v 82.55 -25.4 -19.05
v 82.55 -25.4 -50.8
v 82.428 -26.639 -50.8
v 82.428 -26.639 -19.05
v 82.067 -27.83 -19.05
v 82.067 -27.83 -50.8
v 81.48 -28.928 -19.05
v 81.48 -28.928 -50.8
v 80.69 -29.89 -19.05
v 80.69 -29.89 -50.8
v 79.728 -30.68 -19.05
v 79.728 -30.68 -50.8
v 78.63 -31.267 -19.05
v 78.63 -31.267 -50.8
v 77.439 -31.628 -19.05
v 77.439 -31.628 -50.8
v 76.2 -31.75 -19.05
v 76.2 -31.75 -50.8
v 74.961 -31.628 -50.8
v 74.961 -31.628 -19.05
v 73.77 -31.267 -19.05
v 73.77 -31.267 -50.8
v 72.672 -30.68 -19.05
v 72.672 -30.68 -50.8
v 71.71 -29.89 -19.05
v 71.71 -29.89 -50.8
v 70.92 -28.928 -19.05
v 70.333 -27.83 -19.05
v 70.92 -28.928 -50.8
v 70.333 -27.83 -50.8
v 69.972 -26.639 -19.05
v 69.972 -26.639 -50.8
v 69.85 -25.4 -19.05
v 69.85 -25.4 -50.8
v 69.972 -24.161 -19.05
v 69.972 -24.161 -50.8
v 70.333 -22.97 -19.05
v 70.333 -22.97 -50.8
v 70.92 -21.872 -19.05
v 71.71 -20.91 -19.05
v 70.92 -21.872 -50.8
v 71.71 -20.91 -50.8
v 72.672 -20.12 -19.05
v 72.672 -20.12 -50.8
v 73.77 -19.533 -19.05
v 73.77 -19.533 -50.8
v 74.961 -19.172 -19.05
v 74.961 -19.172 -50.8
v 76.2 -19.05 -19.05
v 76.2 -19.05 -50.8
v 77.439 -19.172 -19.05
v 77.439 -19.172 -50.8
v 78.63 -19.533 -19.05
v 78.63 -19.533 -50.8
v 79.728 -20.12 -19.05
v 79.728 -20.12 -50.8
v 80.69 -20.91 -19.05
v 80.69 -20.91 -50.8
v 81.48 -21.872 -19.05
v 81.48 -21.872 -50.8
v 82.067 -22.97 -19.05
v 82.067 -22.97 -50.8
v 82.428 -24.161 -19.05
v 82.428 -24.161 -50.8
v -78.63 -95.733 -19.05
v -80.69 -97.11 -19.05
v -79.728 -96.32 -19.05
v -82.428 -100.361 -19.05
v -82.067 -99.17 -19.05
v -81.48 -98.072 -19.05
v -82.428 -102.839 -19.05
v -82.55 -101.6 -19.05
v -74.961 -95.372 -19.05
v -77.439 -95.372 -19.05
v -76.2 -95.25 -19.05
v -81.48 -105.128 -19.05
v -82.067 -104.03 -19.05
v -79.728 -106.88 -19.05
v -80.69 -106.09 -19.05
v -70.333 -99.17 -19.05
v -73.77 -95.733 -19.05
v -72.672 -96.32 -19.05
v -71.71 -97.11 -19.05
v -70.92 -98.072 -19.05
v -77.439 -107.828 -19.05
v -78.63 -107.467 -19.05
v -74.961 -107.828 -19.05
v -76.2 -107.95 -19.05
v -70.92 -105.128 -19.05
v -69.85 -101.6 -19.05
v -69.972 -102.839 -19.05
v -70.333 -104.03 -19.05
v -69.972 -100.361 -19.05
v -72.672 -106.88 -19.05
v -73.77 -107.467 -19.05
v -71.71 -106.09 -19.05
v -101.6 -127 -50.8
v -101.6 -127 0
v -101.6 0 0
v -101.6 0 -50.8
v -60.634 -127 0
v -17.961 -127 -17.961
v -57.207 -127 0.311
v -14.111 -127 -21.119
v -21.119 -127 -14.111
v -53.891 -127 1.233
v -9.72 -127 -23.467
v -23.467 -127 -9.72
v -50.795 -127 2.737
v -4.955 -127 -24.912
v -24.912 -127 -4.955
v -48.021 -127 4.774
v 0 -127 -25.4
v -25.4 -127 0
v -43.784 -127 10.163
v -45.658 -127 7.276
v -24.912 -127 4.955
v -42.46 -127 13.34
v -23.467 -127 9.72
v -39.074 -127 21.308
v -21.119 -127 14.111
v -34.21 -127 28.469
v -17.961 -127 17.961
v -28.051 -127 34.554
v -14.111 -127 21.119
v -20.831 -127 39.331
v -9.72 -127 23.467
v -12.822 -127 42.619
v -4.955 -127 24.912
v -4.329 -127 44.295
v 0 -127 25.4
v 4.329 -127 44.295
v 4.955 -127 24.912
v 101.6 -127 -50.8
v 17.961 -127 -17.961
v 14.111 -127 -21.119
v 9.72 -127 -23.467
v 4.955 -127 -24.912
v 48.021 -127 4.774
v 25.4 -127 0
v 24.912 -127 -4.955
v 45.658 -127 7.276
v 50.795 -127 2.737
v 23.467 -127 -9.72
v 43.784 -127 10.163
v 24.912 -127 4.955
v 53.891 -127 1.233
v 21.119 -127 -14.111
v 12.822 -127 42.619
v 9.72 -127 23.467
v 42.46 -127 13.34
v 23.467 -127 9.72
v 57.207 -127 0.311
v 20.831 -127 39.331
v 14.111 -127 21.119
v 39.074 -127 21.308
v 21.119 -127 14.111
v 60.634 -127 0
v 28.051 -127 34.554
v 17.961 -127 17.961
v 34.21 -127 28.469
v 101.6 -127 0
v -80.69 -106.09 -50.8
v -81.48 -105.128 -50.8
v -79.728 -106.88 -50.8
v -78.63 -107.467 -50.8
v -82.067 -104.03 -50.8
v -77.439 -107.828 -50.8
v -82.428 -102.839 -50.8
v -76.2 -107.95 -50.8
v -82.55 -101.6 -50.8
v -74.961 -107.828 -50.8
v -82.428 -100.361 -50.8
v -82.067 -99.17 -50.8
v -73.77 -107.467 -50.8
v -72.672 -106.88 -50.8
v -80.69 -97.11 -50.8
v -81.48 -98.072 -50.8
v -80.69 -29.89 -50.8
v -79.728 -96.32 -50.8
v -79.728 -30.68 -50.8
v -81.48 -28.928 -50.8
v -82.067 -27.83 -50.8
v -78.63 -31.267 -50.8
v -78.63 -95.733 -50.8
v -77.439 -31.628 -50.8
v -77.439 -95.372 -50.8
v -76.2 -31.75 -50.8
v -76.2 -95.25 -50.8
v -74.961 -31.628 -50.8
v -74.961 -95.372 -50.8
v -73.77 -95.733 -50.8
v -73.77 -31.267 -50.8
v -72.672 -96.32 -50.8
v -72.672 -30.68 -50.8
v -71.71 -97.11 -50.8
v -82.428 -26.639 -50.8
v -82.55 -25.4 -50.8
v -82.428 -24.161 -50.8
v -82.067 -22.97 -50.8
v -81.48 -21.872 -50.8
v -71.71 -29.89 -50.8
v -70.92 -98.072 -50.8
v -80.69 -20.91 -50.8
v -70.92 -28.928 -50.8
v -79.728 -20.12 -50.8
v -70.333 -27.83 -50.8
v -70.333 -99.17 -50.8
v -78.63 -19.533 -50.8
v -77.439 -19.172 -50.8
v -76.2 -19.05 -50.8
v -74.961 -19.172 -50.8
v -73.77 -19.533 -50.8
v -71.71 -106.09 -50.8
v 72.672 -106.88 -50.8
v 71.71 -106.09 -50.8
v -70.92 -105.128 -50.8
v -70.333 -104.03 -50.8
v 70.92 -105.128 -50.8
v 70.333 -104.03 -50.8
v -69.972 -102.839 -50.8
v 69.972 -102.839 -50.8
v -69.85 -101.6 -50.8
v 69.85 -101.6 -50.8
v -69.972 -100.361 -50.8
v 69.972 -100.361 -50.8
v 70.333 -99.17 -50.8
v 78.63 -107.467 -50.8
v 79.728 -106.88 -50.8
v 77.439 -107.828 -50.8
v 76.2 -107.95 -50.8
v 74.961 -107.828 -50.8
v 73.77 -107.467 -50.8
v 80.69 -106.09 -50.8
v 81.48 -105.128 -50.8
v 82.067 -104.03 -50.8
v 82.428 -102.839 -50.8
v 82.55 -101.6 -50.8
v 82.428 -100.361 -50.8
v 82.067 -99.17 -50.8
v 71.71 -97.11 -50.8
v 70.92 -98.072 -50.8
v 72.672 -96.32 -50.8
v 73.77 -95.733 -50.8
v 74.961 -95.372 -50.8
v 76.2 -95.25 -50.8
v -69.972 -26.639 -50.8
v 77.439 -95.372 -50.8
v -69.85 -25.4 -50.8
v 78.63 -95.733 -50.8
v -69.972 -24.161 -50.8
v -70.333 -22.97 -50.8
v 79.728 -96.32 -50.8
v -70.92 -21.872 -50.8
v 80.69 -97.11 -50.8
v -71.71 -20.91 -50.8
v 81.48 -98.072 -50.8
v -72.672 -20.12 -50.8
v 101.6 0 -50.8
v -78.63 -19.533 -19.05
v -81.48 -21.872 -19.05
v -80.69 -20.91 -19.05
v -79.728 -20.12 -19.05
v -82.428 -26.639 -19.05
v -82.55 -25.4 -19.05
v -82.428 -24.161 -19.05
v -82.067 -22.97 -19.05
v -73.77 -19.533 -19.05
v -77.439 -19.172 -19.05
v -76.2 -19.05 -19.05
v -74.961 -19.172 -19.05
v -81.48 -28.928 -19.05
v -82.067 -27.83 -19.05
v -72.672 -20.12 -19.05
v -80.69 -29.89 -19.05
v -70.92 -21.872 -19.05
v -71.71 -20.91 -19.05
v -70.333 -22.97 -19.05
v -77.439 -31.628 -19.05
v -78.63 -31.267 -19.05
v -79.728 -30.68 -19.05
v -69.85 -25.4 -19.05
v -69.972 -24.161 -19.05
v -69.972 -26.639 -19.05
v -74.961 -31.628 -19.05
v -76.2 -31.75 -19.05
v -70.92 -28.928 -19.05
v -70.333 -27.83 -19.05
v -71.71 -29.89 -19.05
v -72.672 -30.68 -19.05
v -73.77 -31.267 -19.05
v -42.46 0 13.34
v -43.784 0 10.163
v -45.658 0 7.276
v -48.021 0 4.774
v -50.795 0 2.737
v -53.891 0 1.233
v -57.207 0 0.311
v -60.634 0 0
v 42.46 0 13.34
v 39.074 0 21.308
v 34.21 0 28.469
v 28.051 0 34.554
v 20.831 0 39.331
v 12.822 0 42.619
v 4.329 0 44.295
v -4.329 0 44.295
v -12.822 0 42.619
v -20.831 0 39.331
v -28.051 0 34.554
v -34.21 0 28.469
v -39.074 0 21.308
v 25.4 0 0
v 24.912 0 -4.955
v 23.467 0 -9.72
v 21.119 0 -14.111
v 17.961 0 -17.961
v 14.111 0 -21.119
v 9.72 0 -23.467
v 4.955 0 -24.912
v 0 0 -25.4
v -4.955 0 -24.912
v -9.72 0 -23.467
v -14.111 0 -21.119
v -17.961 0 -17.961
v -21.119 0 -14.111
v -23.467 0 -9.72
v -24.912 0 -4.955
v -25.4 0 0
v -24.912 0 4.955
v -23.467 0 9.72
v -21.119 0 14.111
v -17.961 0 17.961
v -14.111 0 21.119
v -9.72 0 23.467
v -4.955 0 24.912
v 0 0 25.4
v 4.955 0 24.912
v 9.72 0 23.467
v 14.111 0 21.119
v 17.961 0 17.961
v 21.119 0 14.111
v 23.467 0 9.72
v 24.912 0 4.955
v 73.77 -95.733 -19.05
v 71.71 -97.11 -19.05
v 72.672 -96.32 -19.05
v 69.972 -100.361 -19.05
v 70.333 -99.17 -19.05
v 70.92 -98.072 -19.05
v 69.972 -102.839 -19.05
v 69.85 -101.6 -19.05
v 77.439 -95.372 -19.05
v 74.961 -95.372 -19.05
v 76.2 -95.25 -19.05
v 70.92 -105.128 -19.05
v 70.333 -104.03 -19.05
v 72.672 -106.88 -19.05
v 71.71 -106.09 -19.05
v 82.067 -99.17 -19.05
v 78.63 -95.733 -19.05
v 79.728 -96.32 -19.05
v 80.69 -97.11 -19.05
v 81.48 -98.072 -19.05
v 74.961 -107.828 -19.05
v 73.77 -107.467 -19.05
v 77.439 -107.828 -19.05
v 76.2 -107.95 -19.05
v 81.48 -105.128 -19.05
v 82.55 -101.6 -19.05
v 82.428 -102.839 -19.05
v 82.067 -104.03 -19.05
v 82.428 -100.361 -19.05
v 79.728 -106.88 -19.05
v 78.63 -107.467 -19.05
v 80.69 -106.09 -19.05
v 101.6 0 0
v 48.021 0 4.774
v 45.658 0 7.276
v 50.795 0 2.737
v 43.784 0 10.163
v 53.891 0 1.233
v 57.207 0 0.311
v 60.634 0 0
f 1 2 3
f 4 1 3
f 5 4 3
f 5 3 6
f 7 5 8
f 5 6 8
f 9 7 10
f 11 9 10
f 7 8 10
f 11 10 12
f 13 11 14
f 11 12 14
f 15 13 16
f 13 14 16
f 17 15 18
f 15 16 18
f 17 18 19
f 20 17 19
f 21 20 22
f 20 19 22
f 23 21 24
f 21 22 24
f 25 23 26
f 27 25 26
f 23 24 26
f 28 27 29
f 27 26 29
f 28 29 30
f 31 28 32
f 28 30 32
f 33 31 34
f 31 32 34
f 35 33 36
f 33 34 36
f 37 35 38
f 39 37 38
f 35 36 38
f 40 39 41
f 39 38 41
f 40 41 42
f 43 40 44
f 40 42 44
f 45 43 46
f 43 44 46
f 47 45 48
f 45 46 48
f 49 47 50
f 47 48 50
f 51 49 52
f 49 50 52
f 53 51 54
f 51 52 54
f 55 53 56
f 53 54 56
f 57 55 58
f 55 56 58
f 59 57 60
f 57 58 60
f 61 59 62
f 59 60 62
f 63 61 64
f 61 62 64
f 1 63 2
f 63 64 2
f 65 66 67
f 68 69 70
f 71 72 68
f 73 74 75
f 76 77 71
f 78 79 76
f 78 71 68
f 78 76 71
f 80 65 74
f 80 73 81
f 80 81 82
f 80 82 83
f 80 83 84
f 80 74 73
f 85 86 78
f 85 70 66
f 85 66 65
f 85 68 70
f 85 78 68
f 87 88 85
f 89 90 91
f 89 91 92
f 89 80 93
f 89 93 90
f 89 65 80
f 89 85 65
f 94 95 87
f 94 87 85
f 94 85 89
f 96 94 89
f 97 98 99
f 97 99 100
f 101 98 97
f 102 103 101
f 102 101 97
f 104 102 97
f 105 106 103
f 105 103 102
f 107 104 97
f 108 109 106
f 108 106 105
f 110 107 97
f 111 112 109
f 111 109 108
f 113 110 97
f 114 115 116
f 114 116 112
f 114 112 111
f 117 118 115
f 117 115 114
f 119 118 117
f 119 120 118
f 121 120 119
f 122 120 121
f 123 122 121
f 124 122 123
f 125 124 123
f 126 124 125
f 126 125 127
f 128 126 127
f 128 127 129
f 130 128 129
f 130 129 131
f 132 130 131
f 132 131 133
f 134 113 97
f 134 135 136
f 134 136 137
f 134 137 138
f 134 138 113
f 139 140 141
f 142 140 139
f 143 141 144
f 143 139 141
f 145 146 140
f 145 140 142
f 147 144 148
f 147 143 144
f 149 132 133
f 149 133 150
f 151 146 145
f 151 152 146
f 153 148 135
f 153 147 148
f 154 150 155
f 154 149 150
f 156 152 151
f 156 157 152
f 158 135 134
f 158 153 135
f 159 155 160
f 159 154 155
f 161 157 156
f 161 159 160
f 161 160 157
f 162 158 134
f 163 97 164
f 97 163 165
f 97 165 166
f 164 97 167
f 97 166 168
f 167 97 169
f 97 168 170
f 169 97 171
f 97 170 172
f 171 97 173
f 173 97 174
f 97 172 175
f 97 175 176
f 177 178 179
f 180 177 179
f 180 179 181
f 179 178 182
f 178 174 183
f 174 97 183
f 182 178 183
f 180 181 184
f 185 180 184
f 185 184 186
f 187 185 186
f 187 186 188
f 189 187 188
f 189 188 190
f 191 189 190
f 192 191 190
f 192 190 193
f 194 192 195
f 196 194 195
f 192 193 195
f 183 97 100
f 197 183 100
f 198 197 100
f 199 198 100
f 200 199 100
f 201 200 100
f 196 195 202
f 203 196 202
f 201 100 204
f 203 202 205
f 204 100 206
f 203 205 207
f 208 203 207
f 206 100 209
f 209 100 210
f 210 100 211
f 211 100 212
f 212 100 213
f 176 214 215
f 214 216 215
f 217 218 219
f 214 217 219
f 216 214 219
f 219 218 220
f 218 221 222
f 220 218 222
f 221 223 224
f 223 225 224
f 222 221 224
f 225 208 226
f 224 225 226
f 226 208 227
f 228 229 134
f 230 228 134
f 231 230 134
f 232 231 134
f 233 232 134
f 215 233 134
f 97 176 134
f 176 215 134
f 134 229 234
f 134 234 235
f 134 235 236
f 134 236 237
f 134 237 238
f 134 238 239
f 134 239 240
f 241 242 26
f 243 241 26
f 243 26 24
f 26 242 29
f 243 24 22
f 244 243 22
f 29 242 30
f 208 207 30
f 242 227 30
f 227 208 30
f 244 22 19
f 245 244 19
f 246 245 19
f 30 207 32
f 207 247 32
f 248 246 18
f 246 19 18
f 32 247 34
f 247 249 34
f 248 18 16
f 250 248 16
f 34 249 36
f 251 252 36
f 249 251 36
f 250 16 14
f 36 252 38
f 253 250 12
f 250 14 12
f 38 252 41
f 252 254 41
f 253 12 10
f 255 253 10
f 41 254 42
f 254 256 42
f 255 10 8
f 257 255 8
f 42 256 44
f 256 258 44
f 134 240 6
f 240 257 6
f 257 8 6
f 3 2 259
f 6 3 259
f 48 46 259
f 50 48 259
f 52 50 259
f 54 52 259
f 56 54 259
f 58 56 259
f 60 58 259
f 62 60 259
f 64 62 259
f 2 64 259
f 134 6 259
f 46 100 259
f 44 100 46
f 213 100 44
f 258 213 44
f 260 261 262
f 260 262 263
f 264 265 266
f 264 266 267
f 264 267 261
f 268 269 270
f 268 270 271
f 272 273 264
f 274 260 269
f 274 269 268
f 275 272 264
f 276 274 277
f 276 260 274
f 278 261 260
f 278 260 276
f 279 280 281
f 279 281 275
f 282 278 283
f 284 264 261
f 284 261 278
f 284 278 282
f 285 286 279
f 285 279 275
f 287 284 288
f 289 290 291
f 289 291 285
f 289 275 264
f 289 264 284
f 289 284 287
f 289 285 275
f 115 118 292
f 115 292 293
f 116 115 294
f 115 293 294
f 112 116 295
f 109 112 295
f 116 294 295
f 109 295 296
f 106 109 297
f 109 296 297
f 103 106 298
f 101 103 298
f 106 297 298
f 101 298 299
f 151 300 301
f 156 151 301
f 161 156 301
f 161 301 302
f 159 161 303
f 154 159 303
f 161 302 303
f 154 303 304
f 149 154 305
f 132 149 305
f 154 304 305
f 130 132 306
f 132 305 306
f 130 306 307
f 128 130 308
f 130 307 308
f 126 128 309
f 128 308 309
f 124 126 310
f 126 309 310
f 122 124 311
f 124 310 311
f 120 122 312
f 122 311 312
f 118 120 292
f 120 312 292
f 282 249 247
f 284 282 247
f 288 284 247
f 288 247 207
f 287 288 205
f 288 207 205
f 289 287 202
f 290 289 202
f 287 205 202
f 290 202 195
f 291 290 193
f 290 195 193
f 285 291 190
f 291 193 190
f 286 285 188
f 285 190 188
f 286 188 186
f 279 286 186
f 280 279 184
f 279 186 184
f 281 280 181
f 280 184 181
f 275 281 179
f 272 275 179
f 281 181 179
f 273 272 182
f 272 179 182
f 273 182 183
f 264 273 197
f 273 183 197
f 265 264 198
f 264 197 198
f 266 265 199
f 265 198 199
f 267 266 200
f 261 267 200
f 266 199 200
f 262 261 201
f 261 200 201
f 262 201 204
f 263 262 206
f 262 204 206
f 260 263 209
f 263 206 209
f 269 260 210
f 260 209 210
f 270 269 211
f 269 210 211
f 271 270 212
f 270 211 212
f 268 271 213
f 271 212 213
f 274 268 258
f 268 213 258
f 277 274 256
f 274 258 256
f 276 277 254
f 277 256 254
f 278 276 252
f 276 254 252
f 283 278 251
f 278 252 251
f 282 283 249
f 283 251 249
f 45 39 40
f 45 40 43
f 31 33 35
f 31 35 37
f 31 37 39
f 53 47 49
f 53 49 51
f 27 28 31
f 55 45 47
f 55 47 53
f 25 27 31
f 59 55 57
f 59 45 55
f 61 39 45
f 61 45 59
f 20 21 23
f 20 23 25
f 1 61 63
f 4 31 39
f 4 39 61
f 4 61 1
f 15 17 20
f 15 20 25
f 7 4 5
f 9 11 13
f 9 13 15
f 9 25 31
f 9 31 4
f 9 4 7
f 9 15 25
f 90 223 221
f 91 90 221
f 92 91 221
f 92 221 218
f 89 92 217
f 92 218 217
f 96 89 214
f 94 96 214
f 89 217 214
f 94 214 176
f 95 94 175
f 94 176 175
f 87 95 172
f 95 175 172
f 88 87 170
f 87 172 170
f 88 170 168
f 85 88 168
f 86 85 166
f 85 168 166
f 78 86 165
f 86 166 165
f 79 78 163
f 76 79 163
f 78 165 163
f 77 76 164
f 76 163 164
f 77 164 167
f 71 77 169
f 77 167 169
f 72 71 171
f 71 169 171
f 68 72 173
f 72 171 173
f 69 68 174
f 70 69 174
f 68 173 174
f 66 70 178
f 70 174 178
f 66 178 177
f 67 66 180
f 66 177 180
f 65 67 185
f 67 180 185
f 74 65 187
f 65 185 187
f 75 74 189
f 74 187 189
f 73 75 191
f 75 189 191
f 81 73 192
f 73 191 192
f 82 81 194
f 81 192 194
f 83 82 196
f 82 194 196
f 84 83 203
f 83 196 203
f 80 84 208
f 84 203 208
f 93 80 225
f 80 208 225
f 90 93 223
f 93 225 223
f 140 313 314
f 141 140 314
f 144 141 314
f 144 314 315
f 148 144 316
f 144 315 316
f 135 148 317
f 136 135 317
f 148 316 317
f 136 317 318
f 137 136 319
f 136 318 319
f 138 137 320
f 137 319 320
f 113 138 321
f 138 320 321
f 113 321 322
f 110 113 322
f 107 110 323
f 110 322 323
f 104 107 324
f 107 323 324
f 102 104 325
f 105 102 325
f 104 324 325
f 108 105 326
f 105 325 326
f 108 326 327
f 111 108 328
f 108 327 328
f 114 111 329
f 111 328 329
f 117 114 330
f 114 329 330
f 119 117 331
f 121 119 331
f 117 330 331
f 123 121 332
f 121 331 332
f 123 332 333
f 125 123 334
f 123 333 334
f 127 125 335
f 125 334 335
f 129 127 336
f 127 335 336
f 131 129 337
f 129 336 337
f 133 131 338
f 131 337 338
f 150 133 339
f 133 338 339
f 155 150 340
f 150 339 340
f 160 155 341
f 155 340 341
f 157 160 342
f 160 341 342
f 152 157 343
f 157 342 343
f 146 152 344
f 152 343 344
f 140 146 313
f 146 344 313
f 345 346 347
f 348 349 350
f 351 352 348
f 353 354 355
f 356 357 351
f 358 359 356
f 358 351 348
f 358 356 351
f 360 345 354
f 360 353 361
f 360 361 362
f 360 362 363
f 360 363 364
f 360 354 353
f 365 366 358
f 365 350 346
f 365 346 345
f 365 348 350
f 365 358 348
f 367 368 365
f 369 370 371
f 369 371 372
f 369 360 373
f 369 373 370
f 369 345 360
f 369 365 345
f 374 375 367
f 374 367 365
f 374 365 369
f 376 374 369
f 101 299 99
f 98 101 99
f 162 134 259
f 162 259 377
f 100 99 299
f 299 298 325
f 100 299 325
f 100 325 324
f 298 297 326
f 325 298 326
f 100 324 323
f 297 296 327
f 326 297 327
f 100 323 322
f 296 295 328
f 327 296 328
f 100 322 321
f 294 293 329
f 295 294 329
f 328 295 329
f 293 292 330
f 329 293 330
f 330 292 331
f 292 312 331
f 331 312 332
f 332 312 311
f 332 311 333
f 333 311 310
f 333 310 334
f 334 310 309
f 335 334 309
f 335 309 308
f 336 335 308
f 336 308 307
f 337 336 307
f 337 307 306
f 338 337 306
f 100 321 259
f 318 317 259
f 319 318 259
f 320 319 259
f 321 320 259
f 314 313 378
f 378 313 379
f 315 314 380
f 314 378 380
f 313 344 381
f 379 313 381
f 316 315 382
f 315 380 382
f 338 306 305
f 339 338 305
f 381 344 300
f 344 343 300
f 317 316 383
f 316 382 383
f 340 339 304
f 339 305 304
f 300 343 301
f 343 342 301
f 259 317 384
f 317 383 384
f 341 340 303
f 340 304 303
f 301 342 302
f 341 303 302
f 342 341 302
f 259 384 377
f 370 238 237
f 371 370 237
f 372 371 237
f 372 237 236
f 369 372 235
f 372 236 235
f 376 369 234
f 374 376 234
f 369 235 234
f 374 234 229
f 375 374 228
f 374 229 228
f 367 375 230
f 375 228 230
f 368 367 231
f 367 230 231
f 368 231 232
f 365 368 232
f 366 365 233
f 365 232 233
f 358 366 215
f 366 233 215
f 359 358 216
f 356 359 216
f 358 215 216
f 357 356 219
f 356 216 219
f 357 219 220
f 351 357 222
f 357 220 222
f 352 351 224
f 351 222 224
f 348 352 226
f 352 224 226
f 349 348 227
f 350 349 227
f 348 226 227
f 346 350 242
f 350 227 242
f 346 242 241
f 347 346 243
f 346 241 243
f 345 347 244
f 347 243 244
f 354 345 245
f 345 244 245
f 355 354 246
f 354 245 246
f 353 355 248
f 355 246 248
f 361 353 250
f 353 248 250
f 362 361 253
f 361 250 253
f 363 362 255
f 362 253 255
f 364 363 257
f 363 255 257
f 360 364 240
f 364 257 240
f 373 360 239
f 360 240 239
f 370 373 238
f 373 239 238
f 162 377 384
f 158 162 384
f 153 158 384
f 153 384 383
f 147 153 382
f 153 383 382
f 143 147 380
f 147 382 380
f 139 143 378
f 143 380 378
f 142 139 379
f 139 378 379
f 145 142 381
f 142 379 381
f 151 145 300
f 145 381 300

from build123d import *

# Parameters (mm, degrees)
F1_DEPTH = 127
F2_R     = 6.35
F3_DEPTH = 31.75


with BuildPart() as f1:
    # F0 (on Front) → F1 (new body)
    with BuildSketch(Plane.XZ):
        with BuildLine():
            ThreePointArc((60.634122, 0), (49.361852, 3.692968), (42.459989, 13.34006))
            ThreePointArc((42.459989, 13.34006), (0, 44.506268), (-42.459989, 13.34006))
            ThreePointArc((-42.459989, 13.34006), (-49.361852, 3.692968), (-60.634122, 0))
            Line((-60.634122, 0), (-101.6, 0))
            Line((-101.6, 0), (-101.6, -50.8))
            Line((-101.6, -50.8), (101.6, -50.8))
            Line((101.6, -50.8), (101.6, 0))
            Line((101.6, 0), (60.634122, 0))
        make_face()
        with BuildLine():
            ThreePointArc((-25.4, 0), (0, 25.4), (25.4, 0))
            ThreePointArc((25.4, 0), (0, -25.4), (-25.4, 0))
        make_face(mode=Mode.SUBTRACT)
    extrude(amount=F1_DEPTH)

    # F2 (on face) → F3 (cut)
    with BuildSketch(Plane(origin=(0, 0, -50.8), x_dir=(1, 0, 0), z_dir=(0, 0, -1))):
        with Locations((-76.2, 101.6)):
            Circle(F2_R)
        with Locations((-76.2, 25.4)):
            Circle(F2_R)
        with Locations((76.2, 25.4)):
            Circle(F2_R)
        with Locations((76.2, 101.6)):
            Circle(F2_R)
    extrude(amount=-F3_DEPTH, mode=Mode.SUBTRACT)


solid = f1.part
